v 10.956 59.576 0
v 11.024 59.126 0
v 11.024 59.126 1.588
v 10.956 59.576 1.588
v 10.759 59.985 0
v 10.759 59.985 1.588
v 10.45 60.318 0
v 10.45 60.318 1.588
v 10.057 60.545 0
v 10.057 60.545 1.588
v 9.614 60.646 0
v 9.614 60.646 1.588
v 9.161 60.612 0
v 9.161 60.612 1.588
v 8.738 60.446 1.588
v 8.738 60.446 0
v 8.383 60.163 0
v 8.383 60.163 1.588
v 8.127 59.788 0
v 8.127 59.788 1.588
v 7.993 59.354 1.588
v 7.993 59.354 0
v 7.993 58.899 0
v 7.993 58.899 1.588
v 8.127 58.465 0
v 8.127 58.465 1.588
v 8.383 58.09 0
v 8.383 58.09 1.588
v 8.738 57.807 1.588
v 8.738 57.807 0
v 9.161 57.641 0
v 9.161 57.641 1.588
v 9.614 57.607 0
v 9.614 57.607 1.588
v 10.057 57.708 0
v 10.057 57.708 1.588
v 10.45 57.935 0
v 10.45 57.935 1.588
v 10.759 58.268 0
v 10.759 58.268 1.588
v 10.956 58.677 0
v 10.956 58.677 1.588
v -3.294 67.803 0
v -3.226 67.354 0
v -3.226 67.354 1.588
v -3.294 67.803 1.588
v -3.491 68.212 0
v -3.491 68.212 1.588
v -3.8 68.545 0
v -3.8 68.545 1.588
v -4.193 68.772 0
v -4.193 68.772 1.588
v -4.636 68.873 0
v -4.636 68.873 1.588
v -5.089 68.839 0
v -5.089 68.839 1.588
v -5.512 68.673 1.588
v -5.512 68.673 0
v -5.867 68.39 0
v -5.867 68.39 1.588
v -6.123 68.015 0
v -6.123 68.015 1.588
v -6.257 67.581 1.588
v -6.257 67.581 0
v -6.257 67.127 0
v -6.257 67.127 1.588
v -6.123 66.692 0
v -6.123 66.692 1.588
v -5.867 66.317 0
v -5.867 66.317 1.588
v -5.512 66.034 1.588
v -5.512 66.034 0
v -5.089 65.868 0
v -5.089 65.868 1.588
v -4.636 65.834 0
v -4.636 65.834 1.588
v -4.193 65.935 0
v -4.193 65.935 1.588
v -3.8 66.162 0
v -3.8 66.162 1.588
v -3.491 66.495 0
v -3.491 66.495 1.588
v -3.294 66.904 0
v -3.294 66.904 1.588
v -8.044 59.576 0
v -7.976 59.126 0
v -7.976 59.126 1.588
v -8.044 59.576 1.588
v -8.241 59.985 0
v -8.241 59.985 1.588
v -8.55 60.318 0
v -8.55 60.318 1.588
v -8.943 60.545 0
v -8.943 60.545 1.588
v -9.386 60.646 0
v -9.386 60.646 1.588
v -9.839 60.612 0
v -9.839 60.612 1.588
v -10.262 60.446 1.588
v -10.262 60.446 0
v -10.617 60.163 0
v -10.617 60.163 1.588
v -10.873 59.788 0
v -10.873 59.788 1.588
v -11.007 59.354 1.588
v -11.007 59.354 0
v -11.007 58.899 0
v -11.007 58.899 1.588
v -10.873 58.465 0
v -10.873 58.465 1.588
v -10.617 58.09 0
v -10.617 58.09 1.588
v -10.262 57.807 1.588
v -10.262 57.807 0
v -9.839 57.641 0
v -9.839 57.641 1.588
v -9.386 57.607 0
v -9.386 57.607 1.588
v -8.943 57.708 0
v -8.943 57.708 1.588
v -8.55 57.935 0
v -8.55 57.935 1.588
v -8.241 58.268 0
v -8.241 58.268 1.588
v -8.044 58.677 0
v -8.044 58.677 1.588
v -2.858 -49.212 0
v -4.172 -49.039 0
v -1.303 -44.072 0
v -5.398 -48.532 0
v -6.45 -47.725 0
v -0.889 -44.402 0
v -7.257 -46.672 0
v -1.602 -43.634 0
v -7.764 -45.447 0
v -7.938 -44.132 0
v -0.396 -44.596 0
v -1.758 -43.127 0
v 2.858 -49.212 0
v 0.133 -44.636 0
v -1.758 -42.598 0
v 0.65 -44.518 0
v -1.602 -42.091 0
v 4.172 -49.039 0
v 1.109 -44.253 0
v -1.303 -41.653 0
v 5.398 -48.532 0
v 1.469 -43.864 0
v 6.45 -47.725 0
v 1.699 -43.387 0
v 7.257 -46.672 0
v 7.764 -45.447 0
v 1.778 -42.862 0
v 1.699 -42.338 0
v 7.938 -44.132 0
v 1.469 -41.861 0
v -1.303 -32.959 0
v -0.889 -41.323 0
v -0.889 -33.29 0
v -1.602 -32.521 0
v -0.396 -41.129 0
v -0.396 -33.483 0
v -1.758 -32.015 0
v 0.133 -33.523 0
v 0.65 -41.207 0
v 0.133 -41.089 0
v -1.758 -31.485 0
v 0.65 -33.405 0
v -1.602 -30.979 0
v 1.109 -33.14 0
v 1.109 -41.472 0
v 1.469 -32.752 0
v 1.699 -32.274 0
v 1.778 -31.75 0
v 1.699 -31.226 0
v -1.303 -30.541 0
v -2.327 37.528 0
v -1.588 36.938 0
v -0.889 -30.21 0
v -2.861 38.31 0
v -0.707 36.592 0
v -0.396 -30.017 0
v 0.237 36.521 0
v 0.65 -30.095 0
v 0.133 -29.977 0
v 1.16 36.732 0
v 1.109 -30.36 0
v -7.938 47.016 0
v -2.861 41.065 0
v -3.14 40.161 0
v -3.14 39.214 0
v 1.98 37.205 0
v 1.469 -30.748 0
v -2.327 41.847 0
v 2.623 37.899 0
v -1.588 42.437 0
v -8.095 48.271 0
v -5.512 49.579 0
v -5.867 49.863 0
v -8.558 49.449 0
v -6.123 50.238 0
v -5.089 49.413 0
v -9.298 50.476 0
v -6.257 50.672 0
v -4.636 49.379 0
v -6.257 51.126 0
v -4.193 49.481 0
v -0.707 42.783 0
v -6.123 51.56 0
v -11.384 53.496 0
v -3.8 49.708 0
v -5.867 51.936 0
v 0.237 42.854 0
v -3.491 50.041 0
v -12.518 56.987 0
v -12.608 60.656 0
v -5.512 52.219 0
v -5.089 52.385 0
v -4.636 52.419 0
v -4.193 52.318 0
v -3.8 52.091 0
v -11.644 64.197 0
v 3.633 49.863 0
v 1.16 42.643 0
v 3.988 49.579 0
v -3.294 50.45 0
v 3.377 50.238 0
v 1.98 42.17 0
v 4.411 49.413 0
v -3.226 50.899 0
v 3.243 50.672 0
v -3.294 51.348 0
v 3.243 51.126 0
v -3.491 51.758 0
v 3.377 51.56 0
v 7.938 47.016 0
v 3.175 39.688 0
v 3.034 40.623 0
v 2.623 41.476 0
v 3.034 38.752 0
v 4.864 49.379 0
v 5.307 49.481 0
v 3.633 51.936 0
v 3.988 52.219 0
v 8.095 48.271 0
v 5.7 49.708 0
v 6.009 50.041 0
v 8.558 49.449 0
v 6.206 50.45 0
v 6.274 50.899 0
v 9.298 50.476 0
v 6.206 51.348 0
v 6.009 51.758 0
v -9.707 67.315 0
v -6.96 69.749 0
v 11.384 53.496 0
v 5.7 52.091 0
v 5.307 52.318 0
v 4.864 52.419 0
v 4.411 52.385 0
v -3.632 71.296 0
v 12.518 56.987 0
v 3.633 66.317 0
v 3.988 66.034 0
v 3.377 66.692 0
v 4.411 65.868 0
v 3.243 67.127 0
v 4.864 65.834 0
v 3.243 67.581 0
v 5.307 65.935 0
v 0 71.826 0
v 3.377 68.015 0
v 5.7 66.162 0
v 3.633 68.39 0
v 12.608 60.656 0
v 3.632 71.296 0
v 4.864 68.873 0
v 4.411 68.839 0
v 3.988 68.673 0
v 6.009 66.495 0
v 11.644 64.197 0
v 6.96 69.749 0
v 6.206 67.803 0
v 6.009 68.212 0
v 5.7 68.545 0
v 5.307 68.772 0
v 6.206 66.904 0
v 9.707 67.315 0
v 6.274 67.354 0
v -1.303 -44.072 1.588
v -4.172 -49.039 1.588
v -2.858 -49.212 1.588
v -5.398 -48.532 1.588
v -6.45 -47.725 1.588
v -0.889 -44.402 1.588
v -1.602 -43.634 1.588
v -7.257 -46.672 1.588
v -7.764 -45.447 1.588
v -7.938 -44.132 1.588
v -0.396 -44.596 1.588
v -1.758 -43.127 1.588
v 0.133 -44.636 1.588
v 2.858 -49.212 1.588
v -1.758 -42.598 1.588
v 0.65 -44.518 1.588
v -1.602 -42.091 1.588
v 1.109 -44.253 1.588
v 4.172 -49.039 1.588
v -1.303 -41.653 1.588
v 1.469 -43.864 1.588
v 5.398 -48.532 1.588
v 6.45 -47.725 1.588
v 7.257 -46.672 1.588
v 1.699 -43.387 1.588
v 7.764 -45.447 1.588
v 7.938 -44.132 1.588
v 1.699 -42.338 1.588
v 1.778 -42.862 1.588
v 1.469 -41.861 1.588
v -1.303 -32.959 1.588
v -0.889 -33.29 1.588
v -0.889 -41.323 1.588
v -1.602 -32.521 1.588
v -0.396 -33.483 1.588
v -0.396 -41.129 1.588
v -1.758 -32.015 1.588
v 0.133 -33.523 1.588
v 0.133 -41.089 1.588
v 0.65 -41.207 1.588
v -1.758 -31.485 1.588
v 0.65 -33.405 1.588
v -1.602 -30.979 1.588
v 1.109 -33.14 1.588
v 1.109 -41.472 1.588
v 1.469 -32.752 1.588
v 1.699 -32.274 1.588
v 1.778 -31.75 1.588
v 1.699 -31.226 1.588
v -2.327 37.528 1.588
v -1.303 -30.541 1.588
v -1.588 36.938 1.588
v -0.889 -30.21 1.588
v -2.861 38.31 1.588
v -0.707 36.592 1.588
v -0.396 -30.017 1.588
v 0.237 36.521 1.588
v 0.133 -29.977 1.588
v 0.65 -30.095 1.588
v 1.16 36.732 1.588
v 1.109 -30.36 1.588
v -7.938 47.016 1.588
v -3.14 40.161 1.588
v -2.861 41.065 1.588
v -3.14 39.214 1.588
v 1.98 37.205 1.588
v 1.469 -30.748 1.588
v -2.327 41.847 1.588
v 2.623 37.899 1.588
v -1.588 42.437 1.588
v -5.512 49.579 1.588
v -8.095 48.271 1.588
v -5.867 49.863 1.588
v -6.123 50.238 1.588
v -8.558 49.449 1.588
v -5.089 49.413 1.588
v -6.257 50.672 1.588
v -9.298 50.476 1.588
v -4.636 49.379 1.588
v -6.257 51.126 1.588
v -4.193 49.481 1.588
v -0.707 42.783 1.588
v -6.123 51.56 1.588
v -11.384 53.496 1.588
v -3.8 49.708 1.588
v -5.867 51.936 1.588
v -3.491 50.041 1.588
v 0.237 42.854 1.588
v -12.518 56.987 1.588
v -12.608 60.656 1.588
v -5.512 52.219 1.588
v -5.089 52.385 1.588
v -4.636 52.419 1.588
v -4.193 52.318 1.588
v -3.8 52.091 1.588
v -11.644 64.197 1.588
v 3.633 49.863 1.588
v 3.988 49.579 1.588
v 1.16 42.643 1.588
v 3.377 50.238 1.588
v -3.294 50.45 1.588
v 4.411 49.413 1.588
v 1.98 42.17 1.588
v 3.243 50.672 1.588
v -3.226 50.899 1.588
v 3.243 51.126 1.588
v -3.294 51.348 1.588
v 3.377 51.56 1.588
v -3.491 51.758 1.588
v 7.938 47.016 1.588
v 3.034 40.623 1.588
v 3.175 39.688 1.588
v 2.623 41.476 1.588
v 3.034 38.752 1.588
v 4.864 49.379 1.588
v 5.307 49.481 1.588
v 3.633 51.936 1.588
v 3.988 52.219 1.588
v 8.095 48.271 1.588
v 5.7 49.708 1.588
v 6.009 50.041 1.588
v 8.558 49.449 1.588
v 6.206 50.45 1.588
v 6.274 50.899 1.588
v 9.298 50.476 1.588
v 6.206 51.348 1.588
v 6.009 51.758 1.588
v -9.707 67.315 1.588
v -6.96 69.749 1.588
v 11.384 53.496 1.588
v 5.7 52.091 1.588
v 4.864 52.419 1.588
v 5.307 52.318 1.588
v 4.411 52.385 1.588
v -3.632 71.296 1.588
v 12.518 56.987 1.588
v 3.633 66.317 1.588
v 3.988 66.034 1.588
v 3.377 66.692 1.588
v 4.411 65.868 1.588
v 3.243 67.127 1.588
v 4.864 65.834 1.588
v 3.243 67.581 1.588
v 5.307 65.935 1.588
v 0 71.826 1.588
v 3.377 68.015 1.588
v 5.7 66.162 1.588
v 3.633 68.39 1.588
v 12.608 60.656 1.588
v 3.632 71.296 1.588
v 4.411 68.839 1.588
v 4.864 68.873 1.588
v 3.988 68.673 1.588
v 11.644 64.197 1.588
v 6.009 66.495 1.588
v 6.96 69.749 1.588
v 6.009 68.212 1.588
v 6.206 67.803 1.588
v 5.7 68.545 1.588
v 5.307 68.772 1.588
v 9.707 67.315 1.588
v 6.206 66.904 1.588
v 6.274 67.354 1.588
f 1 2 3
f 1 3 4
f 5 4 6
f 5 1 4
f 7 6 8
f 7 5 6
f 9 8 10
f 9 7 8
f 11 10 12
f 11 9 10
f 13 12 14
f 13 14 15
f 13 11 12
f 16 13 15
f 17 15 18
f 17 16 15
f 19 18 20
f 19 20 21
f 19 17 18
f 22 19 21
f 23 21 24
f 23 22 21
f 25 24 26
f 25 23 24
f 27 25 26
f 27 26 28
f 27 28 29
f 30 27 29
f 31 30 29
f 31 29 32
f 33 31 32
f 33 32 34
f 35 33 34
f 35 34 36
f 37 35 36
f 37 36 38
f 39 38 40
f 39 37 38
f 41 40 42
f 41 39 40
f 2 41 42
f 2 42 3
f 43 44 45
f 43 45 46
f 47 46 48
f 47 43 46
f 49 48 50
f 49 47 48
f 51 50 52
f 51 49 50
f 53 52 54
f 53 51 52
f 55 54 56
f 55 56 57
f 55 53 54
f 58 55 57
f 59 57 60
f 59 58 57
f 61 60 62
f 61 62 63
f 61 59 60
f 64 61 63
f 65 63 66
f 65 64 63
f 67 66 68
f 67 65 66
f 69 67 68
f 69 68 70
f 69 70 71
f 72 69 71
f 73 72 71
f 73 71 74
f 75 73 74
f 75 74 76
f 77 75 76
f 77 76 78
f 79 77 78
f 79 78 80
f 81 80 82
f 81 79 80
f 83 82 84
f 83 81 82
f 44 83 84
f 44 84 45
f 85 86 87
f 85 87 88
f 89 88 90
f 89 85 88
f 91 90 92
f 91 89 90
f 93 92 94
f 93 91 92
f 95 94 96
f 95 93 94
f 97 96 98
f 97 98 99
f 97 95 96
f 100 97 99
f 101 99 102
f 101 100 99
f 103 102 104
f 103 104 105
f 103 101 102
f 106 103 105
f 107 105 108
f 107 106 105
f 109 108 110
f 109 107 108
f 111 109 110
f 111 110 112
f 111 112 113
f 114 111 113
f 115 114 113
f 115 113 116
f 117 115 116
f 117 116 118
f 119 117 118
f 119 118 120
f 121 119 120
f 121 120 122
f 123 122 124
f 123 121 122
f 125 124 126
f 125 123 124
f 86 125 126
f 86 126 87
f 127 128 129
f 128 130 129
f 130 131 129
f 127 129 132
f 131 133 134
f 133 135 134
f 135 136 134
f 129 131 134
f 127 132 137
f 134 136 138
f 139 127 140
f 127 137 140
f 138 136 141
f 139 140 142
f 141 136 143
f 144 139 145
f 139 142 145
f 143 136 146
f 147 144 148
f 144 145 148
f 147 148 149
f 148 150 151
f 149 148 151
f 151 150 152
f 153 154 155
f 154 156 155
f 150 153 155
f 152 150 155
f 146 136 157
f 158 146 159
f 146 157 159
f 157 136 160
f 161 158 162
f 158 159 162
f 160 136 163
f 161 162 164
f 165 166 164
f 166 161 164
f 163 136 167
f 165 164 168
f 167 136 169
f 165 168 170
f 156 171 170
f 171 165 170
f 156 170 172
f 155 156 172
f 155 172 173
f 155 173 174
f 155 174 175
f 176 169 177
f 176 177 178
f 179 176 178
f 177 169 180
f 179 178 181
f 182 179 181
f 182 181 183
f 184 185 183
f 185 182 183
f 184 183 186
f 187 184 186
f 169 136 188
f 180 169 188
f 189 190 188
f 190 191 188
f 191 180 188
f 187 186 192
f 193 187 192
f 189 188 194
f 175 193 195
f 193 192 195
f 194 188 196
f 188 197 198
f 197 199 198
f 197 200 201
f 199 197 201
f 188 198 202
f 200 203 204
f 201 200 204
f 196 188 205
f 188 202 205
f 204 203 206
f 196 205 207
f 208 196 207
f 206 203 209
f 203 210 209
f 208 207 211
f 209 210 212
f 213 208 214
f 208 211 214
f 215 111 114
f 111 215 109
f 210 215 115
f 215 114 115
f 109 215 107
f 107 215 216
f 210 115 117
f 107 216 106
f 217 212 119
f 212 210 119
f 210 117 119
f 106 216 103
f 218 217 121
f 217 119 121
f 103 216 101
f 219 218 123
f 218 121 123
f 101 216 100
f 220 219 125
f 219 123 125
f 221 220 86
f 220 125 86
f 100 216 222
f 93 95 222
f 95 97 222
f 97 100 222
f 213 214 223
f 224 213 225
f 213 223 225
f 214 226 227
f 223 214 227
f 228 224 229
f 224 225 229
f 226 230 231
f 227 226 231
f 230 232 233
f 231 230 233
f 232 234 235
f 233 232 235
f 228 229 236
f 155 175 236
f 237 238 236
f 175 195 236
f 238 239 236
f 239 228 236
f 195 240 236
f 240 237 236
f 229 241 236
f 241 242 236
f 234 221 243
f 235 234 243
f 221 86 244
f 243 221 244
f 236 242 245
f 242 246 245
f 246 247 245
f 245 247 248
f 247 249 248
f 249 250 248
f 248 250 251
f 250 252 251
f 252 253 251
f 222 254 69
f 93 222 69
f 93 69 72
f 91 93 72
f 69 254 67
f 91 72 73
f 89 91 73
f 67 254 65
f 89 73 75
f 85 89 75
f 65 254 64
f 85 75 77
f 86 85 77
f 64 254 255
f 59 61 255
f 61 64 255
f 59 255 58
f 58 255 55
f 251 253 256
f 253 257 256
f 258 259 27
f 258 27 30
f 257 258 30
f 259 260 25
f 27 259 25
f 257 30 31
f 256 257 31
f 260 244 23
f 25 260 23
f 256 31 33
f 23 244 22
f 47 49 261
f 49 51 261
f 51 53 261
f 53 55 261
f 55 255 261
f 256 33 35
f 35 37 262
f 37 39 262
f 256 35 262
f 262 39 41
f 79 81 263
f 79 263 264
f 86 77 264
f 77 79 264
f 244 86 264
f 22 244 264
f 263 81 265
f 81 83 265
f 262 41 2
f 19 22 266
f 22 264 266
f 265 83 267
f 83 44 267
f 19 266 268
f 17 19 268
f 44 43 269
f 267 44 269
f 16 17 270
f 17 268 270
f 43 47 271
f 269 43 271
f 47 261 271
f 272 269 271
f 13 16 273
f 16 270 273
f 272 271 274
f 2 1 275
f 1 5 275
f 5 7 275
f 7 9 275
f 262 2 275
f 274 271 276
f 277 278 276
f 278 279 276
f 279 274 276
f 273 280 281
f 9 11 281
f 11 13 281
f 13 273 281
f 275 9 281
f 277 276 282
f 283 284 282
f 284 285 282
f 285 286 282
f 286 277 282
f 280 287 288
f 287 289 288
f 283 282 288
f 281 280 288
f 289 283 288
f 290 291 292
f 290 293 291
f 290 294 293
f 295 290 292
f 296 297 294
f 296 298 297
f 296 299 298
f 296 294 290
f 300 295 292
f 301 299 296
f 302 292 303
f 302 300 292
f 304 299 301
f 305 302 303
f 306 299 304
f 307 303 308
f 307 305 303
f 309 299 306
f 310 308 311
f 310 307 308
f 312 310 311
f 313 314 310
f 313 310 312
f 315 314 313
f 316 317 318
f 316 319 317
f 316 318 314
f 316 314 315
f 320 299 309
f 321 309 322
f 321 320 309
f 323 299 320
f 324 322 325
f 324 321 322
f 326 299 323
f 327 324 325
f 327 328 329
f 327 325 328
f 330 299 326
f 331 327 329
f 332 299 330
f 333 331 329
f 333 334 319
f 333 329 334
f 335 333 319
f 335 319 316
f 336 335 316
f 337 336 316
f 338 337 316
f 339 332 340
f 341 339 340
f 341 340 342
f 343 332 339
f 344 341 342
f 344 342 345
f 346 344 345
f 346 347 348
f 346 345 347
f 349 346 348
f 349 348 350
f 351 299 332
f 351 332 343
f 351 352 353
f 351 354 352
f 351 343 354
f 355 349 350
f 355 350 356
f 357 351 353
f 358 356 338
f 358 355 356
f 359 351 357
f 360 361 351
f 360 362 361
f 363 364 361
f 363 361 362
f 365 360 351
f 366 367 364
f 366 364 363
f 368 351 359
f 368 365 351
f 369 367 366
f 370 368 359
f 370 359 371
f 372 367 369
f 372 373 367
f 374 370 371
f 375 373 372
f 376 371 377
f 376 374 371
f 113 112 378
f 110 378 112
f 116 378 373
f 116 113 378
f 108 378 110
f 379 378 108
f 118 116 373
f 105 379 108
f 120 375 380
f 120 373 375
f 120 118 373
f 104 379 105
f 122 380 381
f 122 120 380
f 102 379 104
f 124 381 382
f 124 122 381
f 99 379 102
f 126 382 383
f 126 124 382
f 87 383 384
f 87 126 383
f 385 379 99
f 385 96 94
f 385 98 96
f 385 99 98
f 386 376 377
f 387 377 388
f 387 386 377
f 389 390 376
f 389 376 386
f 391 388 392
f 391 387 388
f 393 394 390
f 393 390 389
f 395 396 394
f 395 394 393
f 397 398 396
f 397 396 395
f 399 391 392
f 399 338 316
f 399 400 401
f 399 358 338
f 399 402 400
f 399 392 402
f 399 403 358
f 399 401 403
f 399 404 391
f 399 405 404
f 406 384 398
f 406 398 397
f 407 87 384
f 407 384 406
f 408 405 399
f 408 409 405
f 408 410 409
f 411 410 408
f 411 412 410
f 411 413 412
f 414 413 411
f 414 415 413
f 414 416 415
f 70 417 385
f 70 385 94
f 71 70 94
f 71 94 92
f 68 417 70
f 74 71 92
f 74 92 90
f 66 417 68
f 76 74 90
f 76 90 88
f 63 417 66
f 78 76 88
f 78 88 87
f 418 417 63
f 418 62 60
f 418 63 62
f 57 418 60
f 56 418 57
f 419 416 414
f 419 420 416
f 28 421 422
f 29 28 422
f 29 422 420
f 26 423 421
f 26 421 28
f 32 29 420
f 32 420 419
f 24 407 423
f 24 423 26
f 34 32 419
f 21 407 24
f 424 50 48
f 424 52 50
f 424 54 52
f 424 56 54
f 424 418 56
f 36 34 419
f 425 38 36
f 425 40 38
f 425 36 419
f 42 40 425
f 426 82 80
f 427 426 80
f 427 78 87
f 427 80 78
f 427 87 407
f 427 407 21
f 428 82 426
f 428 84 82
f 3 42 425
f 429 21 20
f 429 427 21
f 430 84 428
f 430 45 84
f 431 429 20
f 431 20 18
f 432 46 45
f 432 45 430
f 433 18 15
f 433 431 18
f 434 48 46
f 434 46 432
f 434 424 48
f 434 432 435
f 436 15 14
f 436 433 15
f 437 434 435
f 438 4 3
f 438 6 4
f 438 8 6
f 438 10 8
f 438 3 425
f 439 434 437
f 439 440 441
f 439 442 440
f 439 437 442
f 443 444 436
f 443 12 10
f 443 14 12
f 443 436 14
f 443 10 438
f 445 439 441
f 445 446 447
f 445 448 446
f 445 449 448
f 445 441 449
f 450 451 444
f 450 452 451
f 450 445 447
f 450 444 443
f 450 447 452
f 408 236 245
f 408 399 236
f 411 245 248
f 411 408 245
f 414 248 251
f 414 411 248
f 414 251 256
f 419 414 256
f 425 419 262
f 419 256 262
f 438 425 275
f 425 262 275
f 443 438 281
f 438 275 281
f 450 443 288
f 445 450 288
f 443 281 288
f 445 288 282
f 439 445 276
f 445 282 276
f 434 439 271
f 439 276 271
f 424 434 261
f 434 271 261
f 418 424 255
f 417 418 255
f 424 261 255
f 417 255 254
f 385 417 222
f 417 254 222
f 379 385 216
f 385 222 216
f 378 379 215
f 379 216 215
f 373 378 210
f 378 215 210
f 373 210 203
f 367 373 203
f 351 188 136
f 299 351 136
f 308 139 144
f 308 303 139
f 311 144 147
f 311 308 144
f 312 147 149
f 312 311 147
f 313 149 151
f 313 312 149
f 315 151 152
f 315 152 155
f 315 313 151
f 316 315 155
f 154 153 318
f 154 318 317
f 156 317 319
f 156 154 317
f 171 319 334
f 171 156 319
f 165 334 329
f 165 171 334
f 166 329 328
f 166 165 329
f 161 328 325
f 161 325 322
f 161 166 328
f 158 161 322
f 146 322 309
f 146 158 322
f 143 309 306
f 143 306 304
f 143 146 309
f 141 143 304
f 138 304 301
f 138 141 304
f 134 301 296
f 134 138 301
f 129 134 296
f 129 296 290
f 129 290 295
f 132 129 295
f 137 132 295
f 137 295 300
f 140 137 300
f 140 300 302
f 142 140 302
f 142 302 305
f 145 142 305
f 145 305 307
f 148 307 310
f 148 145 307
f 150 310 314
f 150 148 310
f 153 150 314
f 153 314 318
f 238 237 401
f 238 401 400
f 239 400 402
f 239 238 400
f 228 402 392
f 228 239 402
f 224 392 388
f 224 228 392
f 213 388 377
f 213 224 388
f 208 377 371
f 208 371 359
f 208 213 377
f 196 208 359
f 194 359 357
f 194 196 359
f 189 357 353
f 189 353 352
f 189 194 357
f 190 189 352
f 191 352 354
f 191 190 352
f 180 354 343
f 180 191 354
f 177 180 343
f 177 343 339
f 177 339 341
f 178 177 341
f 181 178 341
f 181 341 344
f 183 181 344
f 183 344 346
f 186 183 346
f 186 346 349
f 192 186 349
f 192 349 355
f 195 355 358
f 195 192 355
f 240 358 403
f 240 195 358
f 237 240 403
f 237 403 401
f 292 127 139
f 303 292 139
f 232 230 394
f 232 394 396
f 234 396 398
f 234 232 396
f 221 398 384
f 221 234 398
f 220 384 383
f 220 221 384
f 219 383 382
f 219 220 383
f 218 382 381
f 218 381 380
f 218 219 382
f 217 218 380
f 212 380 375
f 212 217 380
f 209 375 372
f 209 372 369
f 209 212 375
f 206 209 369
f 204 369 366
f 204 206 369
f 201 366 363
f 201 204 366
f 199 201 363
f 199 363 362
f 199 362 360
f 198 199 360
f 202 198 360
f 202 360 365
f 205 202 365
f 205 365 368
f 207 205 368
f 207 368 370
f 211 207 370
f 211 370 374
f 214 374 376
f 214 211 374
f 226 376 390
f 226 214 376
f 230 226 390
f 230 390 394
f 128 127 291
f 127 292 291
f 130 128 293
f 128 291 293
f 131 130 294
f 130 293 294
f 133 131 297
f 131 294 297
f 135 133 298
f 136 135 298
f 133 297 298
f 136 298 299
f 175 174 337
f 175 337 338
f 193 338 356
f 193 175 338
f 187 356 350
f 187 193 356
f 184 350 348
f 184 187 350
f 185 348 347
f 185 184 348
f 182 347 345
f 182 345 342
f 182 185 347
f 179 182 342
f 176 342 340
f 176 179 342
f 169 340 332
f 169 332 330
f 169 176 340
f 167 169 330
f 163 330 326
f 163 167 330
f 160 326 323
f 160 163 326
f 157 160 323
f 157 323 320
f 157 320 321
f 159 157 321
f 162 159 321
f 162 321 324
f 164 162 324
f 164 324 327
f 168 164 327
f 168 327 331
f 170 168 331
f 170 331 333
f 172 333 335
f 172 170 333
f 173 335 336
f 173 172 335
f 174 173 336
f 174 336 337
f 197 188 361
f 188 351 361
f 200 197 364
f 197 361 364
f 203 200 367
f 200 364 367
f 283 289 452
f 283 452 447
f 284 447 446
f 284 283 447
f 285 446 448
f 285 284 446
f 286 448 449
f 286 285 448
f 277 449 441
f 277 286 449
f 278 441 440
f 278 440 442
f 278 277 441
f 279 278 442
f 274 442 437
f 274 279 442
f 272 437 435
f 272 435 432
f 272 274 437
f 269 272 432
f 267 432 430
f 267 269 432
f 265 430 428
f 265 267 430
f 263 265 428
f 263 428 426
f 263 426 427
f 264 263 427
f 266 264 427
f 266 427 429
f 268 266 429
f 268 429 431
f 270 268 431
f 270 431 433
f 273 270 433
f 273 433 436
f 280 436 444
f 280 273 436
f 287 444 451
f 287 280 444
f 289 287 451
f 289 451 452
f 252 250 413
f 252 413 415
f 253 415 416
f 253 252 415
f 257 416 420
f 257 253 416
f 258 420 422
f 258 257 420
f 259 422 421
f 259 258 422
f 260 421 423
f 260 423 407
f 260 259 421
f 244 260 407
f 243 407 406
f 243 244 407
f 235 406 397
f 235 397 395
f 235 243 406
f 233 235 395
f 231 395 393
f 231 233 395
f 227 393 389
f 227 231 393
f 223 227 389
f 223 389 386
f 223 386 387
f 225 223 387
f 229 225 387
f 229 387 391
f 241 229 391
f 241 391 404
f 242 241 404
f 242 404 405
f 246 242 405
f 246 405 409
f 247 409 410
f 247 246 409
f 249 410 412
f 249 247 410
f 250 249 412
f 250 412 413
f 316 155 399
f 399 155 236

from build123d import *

# Parameters (mm, degrees)
F0_R     = 1.778
F0_R_2   = 1.524
F0_R_3   = 3.175
F1_DEPTH = 1.5875
F2_R     = 5.08


with BuildPart() as f1:
    # F0 (on Top) → F1 (new body)
    with BuildSketch(Plane.XY):
        with BuildLine():
            Line((-7.9375, -49.2125), (7.9375, -49.2125))
            Line((7.9375, -49.2125), (7.9375, 49.2125))
            ThreePointArc((7.9375, 49.2125), (0, 71.826434), (-7.9375, 49.2125))
            Line((-7.9375, 49.2125), (-7.9375, -49.2125))
        make_face()
        with Locations((0, -42.8625)):
            Circle(F0_R, mode=Mode.SUBTRACT)
        with Locations((0, -31.75)):
            Circle(F0_R, mode=Mode.SUBTRACT)
        with Locations((-9.5, 59.126434)):
            Circle(F0_R_2, mode=Mode.SUBTRACT)
        with Locations((-4.75, 50.899193)):
            Circle(F0_R_2, mode=Mode.SUBTRACT)
        with Locations((-4.75, 67.353676)):
            Circle(F0_R_2, mode=Mode.SUBTRACT)
        with Locations((0, 39.6875)):
            Circle(F0_R_3, mode=Mode.SUBTRACT)
        with Locations((4.75, 50.899193)):
            Circle(F0_R_2, mode=Mode.SUBTRACT)
        with Locations((4.75, 67.353676)):
            Circle(F0_R_2, mode=Mode.SUBTRACT)
        with Locations((9.5, 59.126434)):
            Circle(F0_R_2, mode=Mode.SUBTRACT)
    extrude(amount=F1_DEPTH)

    # F2
    f2_edges = [f1.edges().sort_by_distance(p)[0] for p in [
        (7.9375, 49.2125, 0.79375),
        (7.9375, -49.2125, 0.79375),
        (-7.9375, -49.2125, 0.79375),
        (-7.9375, 49.2125, 0.79375),
    ]]
    fillet(f2_edges, radius=F2_R)


solid = f1.part
